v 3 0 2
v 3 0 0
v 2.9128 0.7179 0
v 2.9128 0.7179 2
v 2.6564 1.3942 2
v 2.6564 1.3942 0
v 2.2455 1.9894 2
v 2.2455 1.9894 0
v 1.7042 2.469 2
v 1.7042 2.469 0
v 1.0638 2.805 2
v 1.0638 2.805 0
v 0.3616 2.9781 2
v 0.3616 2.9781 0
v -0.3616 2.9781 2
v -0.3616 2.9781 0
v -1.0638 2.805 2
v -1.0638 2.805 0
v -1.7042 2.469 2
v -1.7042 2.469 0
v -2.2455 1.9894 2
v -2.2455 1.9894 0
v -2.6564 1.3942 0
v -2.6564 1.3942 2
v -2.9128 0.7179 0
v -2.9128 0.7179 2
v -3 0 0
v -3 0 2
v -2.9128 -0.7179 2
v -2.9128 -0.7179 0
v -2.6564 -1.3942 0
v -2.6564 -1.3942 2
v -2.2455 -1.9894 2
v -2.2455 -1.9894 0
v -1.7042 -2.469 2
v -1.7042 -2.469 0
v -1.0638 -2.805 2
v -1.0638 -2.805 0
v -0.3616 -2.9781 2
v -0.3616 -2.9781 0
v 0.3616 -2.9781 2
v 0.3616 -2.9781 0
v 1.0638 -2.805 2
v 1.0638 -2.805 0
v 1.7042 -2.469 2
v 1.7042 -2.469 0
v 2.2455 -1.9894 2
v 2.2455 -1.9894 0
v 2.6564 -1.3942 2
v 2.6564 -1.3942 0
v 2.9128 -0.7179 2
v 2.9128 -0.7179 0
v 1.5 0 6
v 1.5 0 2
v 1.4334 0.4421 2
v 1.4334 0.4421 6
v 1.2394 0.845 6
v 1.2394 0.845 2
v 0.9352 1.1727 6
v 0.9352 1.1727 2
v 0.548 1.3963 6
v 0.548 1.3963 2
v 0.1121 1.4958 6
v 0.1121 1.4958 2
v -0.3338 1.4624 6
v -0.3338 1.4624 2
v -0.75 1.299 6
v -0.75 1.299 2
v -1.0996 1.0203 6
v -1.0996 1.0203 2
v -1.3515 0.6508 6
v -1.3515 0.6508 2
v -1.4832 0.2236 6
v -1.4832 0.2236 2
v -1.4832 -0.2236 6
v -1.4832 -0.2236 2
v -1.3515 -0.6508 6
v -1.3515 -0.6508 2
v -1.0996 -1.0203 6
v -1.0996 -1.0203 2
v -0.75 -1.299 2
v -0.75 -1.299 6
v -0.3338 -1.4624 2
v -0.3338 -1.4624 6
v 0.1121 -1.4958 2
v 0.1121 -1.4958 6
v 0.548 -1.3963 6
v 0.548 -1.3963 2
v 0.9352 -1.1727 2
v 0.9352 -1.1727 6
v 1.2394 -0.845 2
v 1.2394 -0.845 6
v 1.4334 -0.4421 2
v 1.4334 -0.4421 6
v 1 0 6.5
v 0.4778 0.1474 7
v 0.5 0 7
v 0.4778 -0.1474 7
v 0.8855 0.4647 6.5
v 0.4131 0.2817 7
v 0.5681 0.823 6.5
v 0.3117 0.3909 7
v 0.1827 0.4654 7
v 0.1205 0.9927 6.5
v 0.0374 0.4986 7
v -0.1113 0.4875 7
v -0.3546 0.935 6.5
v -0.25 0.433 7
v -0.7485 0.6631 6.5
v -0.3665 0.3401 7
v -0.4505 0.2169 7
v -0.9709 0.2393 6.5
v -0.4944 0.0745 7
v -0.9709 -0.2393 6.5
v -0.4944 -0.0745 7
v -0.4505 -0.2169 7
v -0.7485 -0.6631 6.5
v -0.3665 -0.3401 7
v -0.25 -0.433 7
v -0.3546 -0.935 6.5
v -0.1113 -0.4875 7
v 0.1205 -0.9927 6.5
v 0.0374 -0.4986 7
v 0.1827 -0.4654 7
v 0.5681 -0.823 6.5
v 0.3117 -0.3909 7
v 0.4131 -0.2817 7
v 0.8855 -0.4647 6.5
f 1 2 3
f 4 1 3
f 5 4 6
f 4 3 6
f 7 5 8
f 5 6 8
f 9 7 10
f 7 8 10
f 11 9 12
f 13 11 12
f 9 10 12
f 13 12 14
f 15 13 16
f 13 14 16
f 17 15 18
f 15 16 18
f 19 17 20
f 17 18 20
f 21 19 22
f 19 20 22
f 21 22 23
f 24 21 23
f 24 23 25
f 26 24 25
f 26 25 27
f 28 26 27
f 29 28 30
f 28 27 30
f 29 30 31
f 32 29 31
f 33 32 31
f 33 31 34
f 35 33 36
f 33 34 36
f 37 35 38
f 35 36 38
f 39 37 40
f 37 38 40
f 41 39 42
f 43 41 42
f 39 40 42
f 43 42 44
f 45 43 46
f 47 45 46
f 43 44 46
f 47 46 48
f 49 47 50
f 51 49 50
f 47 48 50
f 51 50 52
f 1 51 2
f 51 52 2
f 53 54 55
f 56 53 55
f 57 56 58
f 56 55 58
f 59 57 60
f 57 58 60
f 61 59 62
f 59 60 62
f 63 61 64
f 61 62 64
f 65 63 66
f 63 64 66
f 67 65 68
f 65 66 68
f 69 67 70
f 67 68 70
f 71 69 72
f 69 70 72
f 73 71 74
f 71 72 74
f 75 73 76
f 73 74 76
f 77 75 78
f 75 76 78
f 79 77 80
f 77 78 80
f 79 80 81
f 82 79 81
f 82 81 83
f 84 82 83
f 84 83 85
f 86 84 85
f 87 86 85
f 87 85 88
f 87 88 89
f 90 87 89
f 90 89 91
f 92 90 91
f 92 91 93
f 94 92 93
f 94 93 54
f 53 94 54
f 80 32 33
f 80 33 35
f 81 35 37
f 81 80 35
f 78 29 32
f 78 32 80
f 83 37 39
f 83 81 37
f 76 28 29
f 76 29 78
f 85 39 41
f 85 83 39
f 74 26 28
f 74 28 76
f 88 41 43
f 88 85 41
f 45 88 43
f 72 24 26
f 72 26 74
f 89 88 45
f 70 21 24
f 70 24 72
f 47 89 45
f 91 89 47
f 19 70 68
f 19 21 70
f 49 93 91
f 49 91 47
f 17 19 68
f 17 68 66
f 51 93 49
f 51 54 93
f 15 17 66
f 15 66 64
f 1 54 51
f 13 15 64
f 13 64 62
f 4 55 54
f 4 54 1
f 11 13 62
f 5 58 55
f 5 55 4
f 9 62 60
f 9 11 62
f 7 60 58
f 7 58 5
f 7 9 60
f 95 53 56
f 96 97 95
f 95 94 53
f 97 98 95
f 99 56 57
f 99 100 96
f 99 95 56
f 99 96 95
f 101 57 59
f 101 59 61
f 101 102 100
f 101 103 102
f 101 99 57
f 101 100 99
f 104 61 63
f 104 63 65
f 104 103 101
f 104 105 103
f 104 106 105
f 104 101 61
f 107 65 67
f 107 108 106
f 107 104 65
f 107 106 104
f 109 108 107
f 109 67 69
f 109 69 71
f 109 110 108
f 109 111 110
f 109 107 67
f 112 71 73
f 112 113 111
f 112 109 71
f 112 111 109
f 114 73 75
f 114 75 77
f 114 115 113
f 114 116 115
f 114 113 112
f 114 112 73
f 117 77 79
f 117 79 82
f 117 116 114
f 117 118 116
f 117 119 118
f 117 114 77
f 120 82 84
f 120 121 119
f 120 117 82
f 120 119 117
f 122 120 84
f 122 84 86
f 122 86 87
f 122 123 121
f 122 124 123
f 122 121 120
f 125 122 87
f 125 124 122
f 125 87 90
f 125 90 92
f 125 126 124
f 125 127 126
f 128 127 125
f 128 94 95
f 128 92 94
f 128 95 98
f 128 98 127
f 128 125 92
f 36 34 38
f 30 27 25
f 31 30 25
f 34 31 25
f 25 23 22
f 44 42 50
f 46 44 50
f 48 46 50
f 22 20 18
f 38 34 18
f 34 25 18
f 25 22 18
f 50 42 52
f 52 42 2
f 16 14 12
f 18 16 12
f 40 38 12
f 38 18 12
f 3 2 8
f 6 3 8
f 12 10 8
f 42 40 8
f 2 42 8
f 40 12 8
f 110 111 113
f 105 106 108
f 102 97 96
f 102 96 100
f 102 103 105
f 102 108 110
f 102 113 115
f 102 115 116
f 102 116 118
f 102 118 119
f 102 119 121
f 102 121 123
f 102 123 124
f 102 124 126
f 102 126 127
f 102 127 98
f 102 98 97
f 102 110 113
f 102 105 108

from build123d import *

# Parameters (mm, degrees)
F0_R     = 3
F0_R_2   = 1.5
F1_DEPTH = 2
F2_DEPTH = 7
F3_SIZE  = 1


with BuildPart() as f1:
    # F0 (on Top) → F1 (new body)
    with BuildSketch(Plane.XY):
        Circle(F0_R)
        Circle(F0_R_2, mode=Mode.SUBTRACT)
    extrude(amount=F1_DEPTH)

    # F0 (on Top) → F2 (join)
    with BuildSketch(Plane.XY):
        Circle(F0_R_2)
    extrude(amount=F2_DEPTH)

    # F3
    f3_edges = [f1.edges().sort_by_distance(p)[0] for p in [
        (-1.5, 0, 7),
    ]]
    chamfer(f3_edges, length=F3_SIZE)


solid = f1.part
